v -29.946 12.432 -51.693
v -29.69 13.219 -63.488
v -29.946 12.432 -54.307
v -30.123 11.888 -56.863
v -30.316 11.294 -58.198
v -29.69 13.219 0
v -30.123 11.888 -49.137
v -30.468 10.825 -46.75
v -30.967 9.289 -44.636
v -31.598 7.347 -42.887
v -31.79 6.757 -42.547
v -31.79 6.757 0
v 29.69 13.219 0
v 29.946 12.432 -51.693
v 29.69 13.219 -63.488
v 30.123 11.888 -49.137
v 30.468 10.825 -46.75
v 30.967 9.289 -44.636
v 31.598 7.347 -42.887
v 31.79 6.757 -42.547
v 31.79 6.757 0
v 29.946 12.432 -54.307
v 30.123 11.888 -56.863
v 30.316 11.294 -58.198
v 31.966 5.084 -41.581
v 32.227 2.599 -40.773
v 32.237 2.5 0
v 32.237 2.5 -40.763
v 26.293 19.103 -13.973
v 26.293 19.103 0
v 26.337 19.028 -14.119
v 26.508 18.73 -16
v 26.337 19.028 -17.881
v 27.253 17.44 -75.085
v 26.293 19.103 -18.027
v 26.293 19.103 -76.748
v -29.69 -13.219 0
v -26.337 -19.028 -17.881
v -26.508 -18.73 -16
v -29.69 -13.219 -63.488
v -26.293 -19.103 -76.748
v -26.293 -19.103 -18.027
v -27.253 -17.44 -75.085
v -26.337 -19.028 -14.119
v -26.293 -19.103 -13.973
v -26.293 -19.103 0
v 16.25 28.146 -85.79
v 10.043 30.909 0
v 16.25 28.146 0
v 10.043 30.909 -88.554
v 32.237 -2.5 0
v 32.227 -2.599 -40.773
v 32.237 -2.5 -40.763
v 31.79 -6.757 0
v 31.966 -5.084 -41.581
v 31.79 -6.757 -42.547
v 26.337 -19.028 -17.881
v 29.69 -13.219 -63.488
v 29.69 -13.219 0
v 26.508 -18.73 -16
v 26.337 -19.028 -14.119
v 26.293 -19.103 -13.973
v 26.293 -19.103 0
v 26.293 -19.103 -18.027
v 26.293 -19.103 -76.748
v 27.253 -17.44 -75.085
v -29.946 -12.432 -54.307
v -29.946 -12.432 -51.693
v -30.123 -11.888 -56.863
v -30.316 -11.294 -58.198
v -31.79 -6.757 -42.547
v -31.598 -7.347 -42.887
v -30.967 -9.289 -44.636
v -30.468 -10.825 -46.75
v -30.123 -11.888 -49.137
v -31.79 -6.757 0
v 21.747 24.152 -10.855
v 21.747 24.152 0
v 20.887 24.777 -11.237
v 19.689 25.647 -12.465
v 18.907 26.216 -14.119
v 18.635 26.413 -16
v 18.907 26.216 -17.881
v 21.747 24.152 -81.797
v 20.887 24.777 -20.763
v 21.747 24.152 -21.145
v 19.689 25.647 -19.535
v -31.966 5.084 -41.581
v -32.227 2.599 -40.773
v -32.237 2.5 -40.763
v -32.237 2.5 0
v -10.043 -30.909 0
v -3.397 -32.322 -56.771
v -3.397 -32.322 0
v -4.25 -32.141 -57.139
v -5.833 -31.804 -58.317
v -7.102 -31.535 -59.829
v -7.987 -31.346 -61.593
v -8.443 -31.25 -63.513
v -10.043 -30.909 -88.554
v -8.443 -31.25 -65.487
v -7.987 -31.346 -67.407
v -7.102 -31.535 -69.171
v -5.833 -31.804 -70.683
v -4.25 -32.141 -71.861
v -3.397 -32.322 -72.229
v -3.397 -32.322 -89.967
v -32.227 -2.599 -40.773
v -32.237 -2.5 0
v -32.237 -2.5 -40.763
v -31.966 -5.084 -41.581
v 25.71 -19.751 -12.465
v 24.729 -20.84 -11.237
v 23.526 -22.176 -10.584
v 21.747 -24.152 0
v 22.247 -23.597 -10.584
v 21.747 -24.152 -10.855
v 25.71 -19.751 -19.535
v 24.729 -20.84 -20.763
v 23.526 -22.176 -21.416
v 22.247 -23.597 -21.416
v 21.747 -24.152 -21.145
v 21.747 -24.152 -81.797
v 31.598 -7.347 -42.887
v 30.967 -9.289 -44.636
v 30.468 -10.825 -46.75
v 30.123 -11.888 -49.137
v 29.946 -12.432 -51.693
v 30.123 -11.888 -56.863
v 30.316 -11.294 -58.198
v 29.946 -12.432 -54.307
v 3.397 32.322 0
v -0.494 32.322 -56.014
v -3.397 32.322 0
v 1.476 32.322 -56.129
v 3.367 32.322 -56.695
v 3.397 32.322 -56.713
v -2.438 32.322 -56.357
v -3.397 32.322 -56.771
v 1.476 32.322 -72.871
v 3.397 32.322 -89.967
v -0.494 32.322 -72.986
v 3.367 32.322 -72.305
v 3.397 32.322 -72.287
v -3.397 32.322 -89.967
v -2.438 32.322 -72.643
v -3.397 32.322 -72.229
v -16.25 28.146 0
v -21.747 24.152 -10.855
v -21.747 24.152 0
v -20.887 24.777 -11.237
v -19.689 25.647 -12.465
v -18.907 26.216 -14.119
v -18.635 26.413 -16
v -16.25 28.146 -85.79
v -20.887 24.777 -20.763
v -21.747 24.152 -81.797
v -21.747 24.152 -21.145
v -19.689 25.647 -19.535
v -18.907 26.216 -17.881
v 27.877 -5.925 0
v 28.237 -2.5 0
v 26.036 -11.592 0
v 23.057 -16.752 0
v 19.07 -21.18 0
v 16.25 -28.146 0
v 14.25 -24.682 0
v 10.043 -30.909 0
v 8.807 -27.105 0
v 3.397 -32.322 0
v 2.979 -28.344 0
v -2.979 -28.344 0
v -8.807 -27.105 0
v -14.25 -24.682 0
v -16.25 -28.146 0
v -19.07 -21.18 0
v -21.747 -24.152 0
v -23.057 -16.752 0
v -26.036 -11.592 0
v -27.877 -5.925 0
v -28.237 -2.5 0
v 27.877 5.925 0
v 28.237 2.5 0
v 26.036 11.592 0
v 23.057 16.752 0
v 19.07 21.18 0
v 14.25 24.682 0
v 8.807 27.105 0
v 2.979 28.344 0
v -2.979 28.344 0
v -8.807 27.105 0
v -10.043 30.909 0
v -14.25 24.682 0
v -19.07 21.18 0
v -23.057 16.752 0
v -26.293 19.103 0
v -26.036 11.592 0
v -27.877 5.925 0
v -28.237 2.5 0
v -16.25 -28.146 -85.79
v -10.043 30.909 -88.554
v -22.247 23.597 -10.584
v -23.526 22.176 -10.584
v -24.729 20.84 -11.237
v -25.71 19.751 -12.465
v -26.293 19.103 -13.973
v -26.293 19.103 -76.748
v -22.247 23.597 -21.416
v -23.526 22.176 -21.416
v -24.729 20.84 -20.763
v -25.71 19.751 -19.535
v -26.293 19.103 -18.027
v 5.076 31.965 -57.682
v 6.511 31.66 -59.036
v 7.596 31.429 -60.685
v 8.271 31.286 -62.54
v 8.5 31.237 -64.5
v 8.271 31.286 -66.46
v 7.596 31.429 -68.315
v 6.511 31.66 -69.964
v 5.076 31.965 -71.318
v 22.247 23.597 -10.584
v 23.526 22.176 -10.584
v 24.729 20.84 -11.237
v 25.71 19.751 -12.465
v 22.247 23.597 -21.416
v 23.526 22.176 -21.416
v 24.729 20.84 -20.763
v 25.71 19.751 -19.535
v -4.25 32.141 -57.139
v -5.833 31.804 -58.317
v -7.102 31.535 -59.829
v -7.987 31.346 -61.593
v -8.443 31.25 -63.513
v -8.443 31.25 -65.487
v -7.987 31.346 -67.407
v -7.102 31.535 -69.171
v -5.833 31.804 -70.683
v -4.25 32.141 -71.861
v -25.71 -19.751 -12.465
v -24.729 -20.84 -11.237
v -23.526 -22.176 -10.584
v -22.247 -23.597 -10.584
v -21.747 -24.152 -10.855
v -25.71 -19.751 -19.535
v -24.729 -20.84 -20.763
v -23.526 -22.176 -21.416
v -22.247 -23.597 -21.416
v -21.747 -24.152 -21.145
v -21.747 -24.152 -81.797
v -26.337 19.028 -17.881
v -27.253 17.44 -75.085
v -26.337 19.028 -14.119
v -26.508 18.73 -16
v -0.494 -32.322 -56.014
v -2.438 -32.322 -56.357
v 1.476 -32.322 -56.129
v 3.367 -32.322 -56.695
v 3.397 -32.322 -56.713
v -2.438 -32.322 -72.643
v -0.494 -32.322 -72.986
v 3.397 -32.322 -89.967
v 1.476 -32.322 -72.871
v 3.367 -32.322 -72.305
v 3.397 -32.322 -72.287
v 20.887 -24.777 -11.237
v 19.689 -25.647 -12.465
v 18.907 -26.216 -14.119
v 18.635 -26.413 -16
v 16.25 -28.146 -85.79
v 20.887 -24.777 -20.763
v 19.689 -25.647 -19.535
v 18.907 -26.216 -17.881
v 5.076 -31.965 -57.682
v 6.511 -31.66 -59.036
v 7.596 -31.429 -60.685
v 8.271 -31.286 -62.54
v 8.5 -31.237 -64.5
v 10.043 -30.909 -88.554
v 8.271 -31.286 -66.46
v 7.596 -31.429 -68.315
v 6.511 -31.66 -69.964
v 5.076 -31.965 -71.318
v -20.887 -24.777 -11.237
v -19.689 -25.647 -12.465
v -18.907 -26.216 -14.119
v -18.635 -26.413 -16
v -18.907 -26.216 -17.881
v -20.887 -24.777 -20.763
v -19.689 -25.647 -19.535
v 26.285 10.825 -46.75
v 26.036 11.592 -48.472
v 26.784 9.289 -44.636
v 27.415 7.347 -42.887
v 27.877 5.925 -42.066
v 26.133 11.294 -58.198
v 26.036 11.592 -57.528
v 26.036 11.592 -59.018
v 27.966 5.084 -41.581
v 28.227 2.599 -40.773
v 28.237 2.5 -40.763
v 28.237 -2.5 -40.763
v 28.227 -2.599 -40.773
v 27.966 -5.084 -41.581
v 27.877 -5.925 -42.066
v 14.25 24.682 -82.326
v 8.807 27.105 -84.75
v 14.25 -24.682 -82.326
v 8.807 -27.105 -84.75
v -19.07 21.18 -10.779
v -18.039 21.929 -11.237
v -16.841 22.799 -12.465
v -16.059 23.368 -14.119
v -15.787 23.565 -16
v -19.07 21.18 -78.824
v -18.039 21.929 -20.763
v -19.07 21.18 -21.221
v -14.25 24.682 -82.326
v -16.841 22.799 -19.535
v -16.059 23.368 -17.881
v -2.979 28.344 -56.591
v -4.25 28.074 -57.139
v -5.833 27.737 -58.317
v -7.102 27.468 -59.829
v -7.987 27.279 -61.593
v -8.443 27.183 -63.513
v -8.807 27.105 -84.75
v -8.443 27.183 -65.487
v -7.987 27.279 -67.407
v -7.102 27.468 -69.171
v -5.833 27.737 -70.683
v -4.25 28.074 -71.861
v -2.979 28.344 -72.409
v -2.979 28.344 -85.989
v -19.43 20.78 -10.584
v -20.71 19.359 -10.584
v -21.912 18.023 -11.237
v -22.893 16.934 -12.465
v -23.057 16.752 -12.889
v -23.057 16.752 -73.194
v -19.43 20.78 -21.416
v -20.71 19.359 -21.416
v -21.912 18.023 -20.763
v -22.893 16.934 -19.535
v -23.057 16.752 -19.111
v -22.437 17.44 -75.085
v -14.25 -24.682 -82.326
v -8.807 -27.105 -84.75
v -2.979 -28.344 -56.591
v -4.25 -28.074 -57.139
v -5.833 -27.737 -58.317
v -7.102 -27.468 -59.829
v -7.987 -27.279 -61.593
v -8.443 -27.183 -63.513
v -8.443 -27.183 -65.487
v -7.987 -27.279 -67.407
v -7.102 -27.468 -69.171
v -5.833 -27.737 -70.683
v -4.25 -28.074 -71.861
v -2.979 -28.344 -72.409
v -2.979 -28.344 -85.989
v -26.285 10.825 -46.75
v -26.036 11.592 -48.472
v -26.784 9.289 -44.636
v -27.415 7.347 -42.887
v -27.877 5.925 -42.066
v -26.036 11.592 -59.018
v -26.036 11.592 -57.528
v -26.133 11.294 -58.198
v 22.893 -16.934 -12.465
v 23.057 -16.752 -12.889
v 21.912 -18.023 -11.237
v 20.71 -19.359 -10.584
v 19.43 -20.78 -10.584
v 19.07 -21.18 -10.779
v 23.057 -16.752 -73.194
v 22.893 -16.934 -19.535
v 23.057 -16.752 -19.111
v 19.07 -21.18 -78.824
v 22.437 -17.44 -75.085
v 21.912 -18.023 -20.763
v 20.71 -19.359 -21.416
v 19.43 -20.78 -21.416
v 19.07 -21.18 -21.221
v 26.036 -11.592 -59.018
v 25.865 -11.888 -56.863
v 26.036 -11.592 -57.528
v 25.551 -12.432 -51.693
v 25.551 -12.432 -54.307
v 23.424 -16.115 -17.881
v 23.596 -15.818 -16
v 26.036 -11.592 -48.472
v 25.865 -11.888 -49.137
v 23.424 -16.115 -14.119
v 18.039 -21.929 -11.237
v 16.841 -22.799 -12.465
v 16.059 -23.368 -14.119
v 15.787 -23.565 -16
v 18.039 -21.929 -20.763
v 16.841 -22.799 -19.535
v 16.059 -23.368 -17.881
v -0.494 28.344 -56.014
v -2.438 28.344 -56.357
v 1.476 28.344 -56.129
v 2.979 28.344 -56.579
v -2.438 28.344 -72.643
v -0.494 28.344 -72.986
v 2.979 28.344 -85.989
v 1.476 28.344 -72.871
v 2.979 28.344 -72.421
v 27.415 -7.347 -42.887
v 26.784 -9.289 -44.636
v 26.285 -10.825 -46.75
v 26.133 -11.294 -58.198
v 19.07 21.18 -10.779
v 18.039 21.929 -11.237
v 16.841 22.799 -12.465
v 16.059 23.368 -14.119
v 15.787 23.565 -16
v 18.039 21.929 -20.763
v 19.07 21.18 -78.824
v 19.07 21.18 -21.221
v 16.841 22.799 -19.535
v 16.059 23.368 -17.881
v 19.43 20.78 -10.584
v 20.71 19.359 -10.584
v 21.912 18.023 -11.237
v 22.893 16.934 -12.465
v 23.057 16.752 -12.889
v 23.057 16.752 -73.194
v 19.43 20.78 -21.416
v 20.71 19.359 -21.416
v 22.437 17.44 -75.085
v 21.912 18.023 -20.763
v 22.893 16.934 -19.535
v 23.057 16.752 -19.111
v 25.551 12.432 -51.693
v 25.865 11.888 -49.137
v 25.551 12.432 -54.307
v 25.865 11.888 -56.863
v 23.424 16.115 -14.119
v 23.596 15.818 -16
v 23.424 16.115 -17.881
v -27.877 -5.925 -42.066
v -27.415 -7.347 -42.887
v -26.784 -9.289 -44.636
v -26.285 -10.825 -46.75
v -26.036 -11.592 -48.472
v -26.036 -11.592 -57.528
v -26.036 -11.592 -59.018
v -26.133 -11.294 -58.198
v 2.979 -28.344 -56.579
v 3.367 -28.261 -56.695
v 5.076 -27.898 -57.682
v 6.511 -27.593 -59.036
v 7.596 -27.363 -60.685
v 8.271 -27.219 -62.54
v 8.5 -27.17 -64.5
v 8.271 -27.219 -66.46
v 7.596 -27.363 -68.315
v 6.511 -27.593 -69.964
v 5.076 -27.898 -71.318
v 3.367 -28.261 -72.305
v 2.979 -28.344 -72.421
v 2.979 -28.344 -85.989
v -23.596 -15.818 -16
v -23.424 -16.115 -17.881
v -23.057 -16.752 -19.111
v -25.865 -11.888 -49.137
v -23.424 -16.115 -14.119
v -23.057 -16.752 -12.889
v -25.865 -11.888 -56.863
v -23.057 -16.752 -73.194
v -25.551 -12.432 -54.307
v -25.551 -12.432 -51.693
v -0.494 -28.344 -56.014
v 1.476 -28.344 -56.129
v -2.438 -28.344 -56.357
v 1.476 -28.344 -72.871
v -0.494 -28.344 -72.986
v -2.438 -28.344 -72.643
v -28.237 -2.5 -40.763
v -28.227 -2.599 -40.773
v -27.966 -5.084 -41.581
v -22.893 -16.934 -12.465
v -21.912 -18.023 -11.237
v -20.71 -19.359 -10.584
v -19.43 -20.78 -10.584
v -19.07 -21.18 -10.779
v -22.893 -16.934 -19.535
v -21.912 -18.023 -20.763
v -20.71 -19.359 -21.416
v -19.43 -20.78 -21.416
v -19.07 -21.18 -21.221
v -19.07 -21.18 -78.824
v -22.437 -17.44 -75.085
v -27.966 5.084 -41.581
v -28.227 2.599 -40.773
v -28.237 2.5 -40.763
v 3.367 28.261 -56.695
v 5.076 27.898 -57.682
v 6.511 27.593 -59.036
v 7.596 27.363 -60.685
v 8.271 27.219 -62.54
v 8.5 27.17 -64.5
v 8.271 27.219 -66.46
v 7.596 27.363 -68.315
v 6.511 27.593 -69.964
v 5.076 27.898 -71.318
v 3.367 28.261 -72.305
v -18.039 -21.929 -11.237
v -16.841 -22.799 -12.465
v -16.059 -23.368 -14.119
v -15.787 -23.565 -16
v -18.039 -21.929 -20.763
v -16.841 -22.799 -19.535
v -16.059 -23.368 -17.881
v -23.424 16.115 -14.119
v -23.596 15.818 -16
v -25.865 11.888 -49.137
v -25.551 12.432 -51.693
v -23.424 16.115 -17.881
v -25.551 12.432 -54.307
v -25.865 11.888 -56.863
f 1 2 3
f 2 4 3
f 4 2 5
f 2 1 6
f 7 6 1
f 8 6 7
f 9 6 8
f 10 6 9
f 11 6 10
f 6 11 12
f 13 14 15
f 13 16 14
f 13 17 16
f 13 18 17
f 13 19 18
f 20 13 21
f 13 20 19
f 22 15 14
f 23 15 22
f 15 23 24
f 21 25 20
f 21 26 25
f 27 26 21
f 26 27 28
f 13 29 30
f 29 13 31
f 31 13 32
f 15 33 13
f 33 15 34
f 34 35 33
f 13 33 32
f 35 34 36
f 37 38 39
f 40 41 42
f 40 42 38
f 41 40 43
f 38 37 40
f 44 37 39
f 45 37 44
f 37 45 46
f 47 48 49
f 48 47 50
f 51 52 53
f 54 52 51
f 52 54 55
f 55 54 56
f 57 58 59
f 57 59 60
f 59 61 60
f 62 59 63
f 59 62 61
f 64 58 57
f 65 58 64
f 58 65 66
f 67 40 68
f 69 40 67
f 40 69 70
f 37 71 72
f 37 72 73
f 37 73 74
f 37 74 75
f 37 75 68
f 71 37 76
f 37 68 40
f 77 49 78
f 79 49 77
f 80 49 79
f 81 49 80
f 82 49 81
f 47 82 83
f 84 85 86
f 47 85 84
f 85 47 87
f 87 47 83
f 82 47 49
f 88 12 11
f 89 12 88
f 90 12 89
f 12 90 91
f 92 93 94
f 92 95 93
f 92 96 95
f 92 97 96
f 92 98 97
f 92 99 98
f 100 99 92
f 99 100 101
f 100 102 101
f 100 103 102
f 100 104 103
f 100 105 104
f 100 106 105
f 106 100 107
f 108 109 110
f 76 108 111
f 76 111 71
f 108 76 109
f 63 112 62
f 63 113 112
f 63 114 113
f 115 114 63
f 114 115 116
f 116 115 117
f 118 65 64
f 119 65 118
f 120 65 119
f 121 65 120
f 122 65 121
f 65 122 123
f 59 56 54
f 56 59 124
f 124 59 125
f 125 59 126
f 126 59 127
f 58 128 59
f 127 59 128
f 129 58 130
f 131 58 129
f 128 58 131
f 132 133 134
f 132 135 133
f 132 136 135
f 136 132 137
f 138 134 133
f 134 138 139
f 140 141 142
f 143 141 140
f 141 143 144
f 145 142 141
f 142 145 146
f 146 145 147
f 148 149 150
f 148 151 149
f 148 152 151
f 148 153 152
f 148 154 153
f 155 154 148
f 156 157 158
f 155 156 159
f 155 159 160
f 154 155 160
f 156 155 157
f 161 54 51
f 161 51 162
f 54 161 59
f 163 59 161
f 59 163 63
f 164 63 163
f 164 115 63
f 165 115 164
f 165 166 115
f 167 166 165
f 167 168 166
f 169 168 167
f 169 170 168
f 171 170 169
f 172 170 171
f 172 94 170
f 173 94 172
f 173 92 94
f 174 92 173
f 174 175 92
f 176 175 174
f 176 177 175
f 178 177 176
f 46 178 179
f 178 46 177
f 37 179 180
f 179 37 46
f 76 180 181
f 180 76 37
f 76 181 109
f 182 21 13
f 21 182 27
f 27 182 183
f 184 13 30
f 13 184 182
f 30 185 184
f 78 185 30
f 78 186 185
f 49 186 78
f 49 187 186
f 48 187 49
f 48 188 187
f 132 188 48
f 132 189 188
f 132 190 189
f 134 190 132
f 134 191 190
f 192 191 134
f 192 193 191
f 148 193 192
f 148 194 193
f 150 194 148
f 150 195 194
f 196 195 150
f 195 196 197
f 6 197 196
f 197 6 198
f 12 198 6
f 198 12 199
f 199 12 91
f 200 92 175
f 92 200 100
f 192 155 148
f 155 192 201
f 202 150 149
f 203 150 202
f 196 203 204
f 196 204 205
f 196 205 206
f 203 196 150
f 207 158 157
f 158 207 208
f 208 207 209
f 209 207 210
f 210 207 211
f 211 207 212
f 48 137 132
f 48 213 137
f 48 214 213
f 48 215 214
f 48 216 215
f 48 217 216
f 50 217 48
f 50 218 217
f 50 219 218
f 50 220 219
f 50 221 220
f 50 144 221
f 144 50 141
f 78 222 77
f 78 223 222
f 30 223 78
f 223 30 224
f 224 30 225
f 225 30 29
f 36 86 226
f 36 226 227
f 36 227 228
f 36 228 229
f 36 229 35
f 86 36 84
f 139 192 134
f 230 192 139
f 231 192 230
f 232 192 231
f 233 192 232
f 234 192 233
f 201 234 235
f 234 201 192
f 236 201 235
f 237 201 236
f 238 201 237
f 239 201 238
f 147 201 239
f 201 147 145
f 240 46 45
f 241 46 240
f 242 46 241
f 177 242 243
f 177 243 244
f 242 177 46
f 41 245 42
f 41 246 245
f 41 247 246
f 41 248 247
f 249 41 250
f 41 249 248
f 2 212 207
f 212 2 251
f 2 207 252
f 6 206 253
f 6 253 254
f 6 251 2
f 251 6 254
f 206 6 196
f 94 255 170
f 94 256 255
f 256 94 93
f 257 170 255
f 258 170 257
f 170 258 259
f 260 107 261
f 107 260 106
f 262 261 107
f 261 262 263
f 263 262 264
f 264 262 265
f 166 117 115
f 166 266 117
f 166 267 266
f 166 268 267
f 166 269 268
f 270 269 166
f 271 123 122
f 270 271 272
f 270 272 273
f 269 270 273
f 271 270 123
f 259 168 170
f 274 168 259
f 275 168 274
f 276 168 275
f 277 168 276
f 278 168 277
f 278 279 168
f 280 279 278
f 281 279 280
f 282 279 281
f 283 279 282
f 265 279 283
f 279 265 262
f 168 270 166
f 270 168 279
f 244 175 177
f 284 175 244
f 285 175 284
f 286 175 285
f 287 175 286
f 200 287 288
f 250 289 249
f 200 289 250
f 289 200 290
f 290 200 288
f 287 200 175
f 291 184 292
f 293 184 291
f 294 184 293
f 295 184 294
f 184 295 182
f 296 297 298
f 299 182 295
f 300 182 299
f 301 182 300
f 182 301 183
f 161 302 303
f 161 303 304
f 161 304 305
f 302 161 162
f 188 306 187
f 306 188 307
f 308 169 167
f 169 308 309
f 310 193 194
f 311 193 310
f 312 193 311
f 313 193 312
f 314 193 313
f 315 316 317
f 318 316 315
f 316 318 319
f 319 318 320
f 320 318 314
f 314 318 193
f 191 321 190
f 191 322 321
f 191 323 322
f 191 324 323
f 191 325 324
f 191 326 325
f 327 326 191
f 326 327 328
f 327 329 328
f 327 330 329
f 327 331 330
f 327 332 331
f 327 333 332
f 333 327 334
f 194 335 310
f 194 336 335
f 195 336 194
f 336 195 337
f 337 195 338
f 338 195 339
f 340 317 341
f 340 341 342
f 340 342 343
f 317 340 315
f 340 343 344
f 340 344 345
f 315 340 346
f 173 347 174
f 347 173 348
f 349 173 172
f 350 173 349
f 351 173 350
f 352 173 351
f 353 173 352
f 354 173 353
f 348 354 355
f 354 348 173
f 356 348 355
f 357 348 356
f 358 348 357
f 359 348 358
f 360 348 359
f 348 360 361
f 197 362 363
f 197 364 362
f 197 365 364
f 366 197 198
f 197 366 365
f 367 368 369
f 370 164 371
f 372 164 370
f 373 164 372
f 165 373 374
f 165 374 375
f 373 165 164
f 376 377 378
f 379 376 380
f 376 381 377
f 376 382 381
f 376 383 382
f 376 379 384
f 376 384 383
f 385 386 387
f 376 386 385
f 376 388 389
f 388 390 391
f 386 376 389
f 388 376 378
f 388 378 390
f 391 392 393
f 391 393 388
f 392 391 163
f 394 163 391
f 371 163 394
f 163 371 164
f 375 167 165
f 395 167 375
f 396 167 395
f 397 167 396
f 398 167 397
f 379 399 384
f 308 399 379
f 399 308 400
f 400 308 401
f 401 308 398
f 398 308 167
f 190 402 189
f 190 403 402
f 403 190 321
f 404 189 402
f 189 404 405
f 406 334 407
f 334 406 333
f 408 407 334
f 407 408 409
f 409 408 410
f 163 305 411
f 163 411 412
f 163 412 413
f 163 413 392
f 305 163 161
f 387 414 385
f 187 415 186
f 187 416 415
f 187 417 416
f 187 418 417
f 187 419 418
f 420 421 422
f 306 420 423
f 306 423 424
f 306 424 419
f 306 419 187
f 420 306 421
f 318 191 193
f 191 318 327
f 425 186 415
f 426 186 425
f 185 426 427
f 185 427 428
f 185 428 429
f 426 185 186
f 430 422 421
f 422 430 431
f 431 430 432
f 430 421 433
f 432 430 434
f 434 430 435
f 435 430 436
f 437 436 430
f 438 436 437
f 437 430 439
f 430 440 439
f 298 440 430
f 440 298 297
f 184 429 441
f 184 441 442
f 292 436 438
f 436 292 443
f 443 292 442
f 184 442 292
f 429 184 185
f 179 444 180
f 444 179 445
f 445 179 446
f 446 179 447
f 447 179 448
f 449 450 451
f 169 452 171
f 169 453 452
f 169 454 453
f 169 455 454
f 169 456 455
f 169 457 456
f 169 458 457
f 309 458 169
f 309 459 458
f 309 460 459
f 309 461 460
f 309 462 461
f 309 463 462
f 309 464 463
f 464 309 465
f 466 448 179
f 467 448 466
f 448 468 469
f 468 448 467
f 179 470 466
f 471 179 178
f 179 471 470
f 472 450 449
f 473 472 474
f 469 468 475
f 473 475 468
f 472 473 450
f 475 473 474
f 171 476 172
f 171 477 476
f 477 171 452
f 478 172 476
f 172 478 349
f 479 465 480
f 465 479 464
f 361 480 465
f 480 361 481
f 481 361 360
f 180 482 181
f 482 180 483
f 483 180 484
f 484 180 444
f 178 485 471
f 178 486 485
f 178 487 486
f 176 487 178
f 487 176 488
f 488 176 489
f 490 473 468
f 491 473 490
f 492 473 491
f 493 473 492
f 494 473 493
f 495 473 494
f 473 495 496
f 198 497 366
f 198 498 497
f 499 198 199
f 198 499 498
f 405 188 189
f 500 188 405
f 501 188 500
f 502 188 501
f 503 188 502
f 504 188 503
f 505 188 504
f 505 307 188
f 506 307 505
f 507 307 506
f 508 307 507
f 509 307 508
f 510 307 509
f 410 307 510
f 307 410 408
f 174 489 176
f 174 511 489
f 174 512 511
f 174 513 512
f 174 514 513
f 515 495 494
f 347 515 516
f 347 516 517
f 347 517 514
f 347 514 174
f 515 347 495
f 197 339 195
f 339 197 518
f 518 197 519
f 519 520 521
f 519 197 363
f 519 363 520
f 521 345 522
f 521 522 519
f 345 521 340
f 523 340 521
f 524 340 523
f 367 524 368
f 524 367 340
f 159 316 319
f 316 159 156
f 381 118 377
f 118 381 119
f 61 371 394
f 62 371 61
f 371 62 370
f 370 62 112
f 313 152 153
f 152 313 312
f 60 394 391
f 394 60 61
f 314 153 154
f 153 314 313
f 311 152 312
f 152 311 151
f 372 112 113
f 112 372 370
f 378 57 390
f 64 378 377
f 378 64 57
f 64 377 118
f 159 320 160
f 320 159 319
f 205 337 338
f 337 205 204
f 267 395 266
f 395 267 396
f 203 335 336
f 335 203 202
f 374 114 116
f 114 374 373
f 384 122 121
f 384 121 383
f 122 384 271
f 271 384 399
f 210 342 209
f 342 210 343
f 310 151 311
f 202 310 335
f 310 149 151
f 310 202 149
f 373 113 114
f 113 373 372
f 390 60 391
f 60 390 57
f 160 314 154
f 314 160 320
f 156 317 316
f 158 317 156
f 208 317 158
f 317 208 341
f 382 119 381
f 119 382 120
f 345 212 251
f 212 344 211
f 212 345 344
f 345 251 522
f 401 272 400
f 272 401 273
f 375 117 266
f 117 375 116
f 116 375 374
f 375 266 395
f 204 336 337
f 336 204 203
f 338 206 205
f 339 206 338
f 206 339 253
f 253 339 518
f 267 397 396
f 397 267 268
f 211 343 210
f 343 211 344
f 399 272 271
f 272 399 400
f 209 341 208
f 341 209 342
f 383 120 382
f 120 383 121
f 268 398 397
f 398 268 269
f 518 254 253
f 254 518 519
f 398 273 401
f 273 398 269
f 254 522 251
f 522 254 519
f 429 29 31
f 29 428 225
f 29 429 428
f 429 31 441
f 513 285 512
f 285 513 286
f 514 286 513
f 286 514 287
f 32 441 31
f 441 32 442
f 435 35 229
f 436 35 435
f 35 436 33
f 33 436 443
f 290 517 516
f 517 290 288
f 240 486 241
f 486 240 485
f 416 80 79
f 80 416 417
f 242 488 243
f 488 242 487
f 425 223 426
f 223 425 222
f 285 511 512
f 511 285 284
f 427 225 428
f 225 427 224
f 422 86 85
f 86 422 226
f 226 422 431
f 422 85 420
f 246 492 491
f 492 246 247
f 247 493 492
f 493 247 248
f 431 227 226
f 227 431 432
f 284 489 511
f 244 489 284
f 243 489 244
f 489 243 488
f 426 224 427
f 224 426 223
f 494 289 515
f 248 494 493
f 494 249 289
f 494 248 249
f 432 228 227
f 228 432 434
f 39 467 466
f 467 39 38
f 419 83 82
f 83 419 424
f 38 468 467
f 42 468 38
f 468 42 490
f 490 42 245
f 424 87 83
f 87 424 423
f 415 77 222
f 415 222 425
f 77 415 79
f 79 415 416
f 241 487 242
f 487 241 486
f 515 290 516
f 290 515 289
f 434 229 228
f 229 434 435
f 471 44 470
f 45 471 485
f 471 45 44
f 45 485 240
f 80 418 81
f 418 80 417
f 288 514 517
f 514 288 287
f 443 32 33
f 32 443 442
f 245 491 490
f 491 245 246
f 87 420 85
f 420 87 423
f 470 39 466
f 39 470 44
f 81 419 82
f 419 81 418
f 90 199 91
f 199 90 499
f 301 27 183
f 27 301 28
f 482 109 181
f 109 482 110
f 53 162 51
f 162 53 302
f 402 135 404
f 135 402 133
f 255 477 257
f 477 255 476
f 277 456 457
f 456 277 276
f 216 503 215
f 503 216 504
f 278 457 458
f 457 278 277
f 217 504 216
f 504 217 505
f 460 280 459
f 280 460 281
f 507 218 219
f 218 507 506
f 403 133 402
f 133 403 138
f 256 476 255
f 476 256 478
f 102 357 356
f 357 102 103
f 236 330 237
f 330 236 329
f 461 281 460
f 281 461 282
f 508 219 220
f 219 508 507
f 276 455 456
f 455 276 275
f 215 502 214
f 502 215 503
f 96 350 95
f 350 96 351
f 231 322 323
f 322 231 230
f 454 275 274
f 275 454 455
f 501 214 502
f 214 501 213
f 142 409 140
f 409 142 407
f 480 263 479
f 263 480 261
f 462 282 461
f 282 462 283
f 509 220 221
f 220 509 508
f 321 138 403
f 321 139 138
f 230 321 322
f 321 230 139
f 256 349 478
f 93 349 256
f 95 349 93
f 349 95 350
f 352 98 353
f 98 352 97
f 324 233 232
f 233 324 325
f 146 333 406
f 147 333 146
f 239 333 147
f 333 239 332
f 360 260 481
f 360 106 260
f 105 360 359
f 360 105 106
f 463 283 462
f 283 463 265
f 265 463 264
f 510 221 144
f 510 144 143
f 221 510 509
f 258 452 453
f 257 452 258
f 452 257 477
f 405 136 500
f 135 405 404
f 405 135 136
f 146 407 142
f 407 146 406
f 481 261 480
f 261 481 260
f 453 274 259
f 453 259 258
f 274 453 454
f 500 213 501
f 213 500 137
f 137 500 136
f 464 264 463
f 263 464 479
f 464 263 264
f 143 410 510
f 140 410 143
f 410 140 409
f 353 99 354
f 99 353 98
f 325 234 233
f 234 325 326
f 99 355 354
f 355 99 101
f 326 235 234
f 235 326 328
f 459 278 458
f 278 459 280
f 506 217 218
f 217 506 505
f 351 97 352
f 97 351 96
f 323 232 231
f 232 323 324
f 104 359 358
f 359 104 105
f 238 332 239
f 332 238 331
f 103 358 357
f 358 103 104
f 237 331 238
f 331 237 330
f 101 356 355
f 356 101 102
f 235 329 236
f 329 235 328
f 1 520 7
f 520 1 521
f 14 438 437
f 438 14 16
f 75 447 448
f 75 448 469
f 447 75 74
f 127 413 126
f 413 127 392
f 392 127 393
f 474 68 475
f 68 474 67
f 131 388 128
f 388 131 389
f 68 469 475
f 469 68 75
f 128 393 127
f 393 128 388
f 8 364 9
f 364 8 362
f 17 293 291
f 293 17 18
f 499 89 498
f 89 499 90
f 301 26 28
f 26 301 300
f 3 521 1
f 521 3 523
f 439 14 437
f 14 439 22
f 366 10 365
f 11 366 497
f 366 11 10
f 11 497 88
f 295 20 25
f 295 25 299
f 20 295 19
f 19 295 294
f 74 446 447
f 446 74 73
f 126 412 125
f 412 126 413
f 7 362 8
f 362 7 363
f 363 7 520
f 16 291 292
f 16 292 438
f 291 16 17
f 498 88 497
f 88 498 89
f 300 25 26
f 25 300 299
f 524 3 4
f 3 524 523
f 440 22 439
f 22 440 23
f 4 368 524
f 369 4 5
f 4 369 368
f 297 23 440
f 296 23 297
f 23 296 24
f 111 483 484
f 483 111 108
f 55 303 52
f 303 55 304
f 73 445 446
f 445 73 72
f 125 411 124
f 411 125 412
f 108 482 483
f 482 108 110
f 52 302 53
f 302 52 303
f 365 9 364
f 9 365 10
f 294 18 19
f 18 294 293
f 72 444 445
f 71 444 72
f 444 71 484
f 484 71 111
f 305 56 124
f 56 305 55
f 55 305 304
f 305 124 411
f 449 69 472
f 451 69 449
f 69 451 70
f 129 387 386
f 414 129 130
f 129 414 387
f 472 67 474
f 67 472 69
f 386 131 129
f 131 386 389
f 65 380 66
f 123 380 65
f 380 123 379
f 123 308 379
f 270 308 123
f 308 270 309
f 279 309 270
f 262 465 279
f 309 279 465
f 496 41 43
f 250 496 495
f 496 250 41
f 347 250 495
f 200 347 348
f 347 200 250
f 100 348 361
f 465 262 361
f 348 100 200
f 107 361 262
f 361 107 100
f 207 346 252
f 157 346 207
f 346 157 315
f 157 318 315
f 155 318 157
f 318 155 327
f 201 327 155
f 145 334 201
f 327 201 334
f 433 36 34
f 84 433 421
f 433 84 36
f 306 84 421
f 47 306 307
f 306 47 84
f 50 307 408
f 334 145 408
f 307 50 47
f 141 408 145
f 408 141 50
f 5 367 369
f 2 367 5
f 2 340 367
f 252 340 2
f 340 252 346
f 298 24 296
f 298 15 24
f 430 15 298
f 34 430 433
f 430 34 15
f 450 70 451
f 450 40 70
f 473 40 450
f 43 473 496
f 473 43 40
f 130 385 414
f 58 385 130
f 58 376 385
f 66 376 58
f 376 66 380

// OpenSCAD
// projection() rotate([90,0,0]) 
Uhi();

/*

    Расстояние от верха шпора до центра вырезанной сферы: 69.5
    = shporH + shimH + sphereOffset



*/

//shimH = 5;
//mastDia = 69;
//sphereDia = 57;
//cutCylDia = 22;




////////////////

uhoHeight = 56.5 + 16 + 17.5; // 90
uhoInnerDia = 57;
sideThick = 4;
uhoOuterDia = uhoInnerDia + 2 * sideThick;

shporH = 52;
shporDia = 57;
holeDia = 10;

// На сколько ниже центр вырезанной сферы 
// Нижней грани шпора 
sphereOffset = 12.5;                    

module Uhi() {

    /*
    translate([0,0,-shporH/2])
    difference() {
        cylinder(h=shporH,d=shporDia,center=true);
    
        dz = shporH/2-holeDia/2 -11;

        translate([0,0,dz]) rotate([0,0,45]) rotate([90,0,0]) cylinder(h=shporDia+10,d=holeDia,center=true);
        translate([0,0,dz]) rotate([0,0,-45]) rotate([90,0,0]) cylinder(h=shporDia+10,d=holeDia,center=true);

        translate([0,0,-sphereOffset -shporH/2]) sphere(d = sphereDia);    




        tempH = sphereDia*1.5;
        tempdz = - shporH/2 - sphereOffset;
        translate([0,0, tempdz])     rotate([0,-72,0]) cylinder(h=tempH,d=cutCylDia,center=true);
        translate([0,0, tempdz])     rotate([0, 72,0]) cylinder(h=tempH,d=cutCylDia,center=true);

    }
    */
    
    translate([0,0,-uhoHeight/2])
    difference() {
        // Труба
        cylinder(h=uhoHeight,d=uhoOuterDia,center=true);
        cylinder(h=uhoHeight+1,d=uhoInnerDia,center=true);
        
        dz = uhoHeight/2 -holeDia/2 -11 ; // shporH/2-holeDia/2 -11;

        // Дырки под болты
       //  translate([0,0,dz]) 
    translate([0,0, uhoHeight/2 - 16])         rotate([0,0,45]) rotate([90,0,0]) cylinder(h=shporDia+10,d=holeDia+1,center=true);
        translate([0,0,dz]) rotate([0,0,-45]) rotate([90,0,0]) cylinder(h=shporDia+10,d=holeDia+1,center=true);
        
        // Деление посредине
        cube([100, 5, 200],center=true);
    
        // Дырки под ось
        translate([0,0,uhoHeight/2-shporH-sphereOffset])  rotate([90,0,0]) cylinder(h=70,d=17,center=true);
        // Дырка под нижнюю опору d22мм
        translate([0,0,uhoHeight/2-42 -22/2])  rotate([0,90,0]) cylinder(h=70,d=25,center=true);
        
        diffH = 50;
        // Продление дырки под нижнюю опору d22мм
        //translate([0,0,+uhoHeight/2 -42 - 22/2 -diffH/2]) cube([100, 25, diffH],center=true);
        
        // Скругление ушей
        translate([0,0,-uhoHeight/2-3]) rotate([45,0,0]) cube([80, 50, 50],center=true);
        translate([0,0,-uhoHeight/2-3]) translate([0,+15,+10]) rotate([20,0,0]) cube([80, 10, 50],center=true);
        translate([0,0,-uhoHeight/2-3]) translate([0,-15,+10]) rotate([-20,0,0]) cube([80, 10, 50],center=true);
    }
}
